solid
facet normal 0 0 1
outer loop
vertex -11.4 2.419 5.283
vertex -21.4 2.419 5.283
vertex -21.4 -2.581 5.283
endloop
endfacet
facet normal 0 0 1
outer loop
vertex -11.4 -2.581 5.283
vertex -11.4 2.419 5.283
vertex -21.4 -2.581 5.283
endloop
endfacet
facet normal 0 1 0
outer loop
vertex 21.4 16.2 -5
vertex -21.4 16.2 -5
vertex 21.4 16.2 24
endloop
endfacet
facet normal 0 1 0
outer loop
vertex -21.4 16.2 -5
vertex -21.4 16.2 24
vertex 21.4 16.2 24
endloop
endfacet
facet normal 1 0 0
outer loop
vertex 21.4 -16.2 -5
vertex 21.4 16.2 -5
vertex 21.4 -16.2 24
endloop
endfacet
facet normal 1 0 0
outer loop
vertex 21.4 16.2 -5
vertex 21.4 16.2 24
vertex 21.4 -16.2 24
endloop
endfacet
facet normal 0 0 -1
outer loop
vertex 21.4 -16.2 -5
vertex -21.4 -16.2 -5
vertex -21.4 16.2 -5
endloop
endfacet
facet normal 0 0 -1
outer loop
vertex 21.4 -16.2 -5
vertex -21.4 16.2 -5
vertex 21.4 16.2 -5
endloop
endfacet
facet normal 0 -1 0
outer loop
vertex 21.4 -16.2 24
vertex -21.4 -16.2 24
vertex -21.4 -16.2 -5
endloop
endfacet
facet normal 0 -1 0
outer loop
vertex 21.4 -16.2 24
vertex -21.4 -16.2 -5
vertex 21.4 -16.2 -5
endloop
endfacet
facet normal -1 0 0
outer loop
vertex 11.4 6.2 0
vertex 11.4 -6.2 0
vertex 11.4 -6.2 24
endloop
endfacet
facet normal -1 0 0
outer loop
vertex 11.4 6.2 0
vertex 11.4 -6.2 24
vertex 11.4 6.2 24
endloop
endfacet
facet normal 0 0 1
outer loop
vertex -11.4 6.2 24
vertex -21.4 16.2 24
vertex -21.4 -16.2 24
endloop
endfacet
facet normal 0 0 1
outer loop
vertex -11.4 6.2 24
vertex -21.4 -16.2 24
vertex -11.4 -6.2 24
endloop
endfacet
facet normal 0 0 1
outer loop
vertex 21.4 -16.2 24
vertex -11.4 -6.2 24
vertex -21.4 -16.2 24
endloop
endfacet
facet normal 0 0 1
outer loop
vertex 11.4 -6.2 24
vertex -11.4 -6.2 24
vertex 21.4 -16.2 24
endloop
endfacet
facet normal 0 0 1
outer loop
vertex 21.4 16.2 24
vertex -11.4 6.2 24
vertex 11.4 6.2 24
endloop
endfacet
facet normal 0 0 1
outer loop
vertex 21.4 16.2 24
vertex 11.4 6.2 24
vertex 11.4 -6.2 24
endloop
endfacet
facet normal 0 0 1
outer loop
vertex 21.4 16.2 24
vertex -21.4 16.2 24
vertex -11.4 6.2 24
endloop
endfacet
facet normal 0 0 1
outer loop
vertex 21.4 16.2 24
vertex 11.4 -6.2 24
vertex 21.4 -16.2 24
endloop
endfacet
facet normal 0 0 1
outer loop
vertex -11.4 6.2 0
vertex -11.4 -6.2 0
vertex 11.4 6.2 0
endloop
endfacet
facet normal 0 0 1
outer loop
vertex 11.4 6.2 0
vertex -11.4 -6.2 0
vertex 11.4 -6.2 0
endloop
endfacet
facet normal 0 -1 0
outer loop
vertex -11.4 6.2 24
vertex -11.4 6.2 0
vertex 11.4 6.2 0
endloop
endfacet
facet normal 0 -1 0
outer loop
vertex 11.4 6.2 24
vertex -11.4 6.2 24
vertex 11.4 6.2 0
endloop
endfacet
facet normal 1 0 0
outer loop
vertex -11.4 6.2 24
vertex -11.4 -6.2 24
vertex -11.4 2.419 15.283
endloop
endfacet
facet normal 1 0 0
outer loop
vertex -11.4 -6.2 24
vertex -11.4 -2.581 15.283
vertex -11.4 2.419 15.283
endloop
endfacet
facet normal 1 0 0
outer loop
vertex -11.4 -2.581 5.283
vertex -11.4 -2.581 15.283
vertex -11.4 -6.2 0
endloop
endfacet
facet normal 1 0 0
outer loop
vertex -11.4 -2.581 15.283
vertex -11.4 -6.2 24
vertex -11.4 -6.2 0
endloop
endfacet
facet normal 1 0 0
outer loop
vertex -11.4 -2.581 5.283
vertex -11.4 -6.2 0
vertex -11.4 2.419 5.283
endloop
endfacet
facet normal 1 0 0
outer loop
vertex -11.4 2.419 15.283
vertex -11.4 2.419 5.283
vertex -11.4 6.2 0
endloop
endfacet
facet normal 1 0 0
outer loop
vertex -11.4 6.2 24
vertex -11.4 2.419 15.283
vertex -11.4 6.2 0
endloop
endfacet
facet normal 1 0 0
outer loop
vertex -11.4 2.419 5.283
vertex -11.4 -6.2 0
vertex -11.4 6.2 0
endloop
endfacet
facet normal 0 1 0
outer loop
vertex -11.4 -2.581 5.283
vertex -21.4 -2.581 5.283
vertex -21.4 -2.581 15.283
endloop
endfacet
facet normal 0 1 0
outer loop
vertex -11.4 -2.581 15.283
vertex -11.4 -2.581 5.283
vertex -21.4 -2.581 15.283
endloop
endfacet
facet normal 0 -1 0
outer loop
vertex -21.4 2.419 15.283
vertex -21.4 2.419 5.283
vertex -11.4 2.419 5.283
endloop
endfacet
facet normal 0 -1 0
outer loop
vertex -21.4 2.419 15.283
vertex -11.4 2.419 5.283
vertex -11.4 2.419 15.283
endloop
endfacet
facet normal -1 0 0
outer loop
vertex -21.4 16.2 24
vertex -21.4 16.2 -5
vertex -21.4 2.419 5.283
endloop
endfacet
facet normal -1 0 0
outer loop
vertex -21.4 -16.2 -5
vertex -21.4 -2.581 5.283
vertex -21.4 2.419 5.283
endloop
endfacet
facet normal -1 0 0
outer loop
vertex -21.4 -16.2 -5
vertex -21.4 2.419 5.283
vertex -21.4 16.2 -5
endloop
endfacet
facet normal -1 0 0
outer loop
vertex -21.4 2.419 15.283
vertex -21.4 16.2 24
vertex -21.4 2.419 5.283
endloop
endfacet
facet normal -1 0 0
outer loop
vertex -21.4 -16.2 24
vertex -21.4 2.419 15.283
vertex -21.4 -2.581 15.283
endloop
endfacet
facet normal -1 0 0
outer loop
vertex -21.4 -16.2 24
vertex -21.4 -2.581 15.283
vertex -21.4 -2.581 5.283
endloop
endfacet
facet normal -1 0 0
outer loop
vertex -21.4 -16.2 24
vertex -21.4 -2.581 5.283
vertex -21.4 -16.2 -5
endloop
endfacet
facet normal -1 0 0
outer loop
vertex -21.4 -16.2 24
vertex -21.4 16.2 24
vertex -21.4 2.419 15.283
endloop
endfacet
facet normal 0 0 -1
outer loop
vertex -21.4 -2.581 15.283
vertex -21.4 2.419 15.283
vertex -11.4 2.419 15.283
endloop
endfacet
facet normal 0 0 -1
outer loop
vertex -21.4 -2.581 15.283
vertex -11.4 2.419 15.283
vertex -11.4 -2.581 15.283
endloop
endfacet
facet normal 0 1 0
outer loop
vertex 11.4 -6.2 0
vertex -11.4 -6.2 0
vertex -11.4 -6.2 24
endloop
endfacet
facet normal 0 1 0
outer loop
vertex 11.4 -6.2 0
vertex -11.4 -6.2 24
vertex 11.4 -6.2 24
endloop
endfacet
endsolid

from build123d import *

# Parameters (mm, degrees)
F0_W     = 42.8
F0_H     = 32.4
F0_W_2   = 22.8
F0_H_2   = 12.4
F1_DEPTH = 24
F2_W     = 42.8
F2_H     = 32.4
F3_DEPTH = 5
F4_W     = 5
F4_H     = 10
F5_DEPTH = 25.4


with BuildPart() as f1:
    # F0 (on Top) → F1 (new body)
    with BuildSketch(Plane.XY):
        Rectangle(F0_W, F0_H)
        Rectangle(F0_W_2, F0_H_2, mode=Mode.SUBTRACT)
    extrude(amount=F1_DEPTH)

    # F2 (on face) → F3 (join)
    with BuildSketch(Plane(origin=(0, 0, 0), x_dir=(1, 0, 0), z_dir=(0, 0, -1))):
        Rectangle(F2_W, F2_H)
    extrude(amount=F3_DEPTH)

    # F4 (on face) → F5 (cut)
    with BuildSketch(Plane(origin=(-21.4, 0, 0), x_dir=(0, -1, 0), z_dir=(-1, 0, 0))):
        with Locations((0.08081, 10.283196)):
            Rectangle(F4_W, F4_H)
    extrude(amount=-F5_DEPTH, mode=Mode.SUBTRACT)


solid = f1.part
